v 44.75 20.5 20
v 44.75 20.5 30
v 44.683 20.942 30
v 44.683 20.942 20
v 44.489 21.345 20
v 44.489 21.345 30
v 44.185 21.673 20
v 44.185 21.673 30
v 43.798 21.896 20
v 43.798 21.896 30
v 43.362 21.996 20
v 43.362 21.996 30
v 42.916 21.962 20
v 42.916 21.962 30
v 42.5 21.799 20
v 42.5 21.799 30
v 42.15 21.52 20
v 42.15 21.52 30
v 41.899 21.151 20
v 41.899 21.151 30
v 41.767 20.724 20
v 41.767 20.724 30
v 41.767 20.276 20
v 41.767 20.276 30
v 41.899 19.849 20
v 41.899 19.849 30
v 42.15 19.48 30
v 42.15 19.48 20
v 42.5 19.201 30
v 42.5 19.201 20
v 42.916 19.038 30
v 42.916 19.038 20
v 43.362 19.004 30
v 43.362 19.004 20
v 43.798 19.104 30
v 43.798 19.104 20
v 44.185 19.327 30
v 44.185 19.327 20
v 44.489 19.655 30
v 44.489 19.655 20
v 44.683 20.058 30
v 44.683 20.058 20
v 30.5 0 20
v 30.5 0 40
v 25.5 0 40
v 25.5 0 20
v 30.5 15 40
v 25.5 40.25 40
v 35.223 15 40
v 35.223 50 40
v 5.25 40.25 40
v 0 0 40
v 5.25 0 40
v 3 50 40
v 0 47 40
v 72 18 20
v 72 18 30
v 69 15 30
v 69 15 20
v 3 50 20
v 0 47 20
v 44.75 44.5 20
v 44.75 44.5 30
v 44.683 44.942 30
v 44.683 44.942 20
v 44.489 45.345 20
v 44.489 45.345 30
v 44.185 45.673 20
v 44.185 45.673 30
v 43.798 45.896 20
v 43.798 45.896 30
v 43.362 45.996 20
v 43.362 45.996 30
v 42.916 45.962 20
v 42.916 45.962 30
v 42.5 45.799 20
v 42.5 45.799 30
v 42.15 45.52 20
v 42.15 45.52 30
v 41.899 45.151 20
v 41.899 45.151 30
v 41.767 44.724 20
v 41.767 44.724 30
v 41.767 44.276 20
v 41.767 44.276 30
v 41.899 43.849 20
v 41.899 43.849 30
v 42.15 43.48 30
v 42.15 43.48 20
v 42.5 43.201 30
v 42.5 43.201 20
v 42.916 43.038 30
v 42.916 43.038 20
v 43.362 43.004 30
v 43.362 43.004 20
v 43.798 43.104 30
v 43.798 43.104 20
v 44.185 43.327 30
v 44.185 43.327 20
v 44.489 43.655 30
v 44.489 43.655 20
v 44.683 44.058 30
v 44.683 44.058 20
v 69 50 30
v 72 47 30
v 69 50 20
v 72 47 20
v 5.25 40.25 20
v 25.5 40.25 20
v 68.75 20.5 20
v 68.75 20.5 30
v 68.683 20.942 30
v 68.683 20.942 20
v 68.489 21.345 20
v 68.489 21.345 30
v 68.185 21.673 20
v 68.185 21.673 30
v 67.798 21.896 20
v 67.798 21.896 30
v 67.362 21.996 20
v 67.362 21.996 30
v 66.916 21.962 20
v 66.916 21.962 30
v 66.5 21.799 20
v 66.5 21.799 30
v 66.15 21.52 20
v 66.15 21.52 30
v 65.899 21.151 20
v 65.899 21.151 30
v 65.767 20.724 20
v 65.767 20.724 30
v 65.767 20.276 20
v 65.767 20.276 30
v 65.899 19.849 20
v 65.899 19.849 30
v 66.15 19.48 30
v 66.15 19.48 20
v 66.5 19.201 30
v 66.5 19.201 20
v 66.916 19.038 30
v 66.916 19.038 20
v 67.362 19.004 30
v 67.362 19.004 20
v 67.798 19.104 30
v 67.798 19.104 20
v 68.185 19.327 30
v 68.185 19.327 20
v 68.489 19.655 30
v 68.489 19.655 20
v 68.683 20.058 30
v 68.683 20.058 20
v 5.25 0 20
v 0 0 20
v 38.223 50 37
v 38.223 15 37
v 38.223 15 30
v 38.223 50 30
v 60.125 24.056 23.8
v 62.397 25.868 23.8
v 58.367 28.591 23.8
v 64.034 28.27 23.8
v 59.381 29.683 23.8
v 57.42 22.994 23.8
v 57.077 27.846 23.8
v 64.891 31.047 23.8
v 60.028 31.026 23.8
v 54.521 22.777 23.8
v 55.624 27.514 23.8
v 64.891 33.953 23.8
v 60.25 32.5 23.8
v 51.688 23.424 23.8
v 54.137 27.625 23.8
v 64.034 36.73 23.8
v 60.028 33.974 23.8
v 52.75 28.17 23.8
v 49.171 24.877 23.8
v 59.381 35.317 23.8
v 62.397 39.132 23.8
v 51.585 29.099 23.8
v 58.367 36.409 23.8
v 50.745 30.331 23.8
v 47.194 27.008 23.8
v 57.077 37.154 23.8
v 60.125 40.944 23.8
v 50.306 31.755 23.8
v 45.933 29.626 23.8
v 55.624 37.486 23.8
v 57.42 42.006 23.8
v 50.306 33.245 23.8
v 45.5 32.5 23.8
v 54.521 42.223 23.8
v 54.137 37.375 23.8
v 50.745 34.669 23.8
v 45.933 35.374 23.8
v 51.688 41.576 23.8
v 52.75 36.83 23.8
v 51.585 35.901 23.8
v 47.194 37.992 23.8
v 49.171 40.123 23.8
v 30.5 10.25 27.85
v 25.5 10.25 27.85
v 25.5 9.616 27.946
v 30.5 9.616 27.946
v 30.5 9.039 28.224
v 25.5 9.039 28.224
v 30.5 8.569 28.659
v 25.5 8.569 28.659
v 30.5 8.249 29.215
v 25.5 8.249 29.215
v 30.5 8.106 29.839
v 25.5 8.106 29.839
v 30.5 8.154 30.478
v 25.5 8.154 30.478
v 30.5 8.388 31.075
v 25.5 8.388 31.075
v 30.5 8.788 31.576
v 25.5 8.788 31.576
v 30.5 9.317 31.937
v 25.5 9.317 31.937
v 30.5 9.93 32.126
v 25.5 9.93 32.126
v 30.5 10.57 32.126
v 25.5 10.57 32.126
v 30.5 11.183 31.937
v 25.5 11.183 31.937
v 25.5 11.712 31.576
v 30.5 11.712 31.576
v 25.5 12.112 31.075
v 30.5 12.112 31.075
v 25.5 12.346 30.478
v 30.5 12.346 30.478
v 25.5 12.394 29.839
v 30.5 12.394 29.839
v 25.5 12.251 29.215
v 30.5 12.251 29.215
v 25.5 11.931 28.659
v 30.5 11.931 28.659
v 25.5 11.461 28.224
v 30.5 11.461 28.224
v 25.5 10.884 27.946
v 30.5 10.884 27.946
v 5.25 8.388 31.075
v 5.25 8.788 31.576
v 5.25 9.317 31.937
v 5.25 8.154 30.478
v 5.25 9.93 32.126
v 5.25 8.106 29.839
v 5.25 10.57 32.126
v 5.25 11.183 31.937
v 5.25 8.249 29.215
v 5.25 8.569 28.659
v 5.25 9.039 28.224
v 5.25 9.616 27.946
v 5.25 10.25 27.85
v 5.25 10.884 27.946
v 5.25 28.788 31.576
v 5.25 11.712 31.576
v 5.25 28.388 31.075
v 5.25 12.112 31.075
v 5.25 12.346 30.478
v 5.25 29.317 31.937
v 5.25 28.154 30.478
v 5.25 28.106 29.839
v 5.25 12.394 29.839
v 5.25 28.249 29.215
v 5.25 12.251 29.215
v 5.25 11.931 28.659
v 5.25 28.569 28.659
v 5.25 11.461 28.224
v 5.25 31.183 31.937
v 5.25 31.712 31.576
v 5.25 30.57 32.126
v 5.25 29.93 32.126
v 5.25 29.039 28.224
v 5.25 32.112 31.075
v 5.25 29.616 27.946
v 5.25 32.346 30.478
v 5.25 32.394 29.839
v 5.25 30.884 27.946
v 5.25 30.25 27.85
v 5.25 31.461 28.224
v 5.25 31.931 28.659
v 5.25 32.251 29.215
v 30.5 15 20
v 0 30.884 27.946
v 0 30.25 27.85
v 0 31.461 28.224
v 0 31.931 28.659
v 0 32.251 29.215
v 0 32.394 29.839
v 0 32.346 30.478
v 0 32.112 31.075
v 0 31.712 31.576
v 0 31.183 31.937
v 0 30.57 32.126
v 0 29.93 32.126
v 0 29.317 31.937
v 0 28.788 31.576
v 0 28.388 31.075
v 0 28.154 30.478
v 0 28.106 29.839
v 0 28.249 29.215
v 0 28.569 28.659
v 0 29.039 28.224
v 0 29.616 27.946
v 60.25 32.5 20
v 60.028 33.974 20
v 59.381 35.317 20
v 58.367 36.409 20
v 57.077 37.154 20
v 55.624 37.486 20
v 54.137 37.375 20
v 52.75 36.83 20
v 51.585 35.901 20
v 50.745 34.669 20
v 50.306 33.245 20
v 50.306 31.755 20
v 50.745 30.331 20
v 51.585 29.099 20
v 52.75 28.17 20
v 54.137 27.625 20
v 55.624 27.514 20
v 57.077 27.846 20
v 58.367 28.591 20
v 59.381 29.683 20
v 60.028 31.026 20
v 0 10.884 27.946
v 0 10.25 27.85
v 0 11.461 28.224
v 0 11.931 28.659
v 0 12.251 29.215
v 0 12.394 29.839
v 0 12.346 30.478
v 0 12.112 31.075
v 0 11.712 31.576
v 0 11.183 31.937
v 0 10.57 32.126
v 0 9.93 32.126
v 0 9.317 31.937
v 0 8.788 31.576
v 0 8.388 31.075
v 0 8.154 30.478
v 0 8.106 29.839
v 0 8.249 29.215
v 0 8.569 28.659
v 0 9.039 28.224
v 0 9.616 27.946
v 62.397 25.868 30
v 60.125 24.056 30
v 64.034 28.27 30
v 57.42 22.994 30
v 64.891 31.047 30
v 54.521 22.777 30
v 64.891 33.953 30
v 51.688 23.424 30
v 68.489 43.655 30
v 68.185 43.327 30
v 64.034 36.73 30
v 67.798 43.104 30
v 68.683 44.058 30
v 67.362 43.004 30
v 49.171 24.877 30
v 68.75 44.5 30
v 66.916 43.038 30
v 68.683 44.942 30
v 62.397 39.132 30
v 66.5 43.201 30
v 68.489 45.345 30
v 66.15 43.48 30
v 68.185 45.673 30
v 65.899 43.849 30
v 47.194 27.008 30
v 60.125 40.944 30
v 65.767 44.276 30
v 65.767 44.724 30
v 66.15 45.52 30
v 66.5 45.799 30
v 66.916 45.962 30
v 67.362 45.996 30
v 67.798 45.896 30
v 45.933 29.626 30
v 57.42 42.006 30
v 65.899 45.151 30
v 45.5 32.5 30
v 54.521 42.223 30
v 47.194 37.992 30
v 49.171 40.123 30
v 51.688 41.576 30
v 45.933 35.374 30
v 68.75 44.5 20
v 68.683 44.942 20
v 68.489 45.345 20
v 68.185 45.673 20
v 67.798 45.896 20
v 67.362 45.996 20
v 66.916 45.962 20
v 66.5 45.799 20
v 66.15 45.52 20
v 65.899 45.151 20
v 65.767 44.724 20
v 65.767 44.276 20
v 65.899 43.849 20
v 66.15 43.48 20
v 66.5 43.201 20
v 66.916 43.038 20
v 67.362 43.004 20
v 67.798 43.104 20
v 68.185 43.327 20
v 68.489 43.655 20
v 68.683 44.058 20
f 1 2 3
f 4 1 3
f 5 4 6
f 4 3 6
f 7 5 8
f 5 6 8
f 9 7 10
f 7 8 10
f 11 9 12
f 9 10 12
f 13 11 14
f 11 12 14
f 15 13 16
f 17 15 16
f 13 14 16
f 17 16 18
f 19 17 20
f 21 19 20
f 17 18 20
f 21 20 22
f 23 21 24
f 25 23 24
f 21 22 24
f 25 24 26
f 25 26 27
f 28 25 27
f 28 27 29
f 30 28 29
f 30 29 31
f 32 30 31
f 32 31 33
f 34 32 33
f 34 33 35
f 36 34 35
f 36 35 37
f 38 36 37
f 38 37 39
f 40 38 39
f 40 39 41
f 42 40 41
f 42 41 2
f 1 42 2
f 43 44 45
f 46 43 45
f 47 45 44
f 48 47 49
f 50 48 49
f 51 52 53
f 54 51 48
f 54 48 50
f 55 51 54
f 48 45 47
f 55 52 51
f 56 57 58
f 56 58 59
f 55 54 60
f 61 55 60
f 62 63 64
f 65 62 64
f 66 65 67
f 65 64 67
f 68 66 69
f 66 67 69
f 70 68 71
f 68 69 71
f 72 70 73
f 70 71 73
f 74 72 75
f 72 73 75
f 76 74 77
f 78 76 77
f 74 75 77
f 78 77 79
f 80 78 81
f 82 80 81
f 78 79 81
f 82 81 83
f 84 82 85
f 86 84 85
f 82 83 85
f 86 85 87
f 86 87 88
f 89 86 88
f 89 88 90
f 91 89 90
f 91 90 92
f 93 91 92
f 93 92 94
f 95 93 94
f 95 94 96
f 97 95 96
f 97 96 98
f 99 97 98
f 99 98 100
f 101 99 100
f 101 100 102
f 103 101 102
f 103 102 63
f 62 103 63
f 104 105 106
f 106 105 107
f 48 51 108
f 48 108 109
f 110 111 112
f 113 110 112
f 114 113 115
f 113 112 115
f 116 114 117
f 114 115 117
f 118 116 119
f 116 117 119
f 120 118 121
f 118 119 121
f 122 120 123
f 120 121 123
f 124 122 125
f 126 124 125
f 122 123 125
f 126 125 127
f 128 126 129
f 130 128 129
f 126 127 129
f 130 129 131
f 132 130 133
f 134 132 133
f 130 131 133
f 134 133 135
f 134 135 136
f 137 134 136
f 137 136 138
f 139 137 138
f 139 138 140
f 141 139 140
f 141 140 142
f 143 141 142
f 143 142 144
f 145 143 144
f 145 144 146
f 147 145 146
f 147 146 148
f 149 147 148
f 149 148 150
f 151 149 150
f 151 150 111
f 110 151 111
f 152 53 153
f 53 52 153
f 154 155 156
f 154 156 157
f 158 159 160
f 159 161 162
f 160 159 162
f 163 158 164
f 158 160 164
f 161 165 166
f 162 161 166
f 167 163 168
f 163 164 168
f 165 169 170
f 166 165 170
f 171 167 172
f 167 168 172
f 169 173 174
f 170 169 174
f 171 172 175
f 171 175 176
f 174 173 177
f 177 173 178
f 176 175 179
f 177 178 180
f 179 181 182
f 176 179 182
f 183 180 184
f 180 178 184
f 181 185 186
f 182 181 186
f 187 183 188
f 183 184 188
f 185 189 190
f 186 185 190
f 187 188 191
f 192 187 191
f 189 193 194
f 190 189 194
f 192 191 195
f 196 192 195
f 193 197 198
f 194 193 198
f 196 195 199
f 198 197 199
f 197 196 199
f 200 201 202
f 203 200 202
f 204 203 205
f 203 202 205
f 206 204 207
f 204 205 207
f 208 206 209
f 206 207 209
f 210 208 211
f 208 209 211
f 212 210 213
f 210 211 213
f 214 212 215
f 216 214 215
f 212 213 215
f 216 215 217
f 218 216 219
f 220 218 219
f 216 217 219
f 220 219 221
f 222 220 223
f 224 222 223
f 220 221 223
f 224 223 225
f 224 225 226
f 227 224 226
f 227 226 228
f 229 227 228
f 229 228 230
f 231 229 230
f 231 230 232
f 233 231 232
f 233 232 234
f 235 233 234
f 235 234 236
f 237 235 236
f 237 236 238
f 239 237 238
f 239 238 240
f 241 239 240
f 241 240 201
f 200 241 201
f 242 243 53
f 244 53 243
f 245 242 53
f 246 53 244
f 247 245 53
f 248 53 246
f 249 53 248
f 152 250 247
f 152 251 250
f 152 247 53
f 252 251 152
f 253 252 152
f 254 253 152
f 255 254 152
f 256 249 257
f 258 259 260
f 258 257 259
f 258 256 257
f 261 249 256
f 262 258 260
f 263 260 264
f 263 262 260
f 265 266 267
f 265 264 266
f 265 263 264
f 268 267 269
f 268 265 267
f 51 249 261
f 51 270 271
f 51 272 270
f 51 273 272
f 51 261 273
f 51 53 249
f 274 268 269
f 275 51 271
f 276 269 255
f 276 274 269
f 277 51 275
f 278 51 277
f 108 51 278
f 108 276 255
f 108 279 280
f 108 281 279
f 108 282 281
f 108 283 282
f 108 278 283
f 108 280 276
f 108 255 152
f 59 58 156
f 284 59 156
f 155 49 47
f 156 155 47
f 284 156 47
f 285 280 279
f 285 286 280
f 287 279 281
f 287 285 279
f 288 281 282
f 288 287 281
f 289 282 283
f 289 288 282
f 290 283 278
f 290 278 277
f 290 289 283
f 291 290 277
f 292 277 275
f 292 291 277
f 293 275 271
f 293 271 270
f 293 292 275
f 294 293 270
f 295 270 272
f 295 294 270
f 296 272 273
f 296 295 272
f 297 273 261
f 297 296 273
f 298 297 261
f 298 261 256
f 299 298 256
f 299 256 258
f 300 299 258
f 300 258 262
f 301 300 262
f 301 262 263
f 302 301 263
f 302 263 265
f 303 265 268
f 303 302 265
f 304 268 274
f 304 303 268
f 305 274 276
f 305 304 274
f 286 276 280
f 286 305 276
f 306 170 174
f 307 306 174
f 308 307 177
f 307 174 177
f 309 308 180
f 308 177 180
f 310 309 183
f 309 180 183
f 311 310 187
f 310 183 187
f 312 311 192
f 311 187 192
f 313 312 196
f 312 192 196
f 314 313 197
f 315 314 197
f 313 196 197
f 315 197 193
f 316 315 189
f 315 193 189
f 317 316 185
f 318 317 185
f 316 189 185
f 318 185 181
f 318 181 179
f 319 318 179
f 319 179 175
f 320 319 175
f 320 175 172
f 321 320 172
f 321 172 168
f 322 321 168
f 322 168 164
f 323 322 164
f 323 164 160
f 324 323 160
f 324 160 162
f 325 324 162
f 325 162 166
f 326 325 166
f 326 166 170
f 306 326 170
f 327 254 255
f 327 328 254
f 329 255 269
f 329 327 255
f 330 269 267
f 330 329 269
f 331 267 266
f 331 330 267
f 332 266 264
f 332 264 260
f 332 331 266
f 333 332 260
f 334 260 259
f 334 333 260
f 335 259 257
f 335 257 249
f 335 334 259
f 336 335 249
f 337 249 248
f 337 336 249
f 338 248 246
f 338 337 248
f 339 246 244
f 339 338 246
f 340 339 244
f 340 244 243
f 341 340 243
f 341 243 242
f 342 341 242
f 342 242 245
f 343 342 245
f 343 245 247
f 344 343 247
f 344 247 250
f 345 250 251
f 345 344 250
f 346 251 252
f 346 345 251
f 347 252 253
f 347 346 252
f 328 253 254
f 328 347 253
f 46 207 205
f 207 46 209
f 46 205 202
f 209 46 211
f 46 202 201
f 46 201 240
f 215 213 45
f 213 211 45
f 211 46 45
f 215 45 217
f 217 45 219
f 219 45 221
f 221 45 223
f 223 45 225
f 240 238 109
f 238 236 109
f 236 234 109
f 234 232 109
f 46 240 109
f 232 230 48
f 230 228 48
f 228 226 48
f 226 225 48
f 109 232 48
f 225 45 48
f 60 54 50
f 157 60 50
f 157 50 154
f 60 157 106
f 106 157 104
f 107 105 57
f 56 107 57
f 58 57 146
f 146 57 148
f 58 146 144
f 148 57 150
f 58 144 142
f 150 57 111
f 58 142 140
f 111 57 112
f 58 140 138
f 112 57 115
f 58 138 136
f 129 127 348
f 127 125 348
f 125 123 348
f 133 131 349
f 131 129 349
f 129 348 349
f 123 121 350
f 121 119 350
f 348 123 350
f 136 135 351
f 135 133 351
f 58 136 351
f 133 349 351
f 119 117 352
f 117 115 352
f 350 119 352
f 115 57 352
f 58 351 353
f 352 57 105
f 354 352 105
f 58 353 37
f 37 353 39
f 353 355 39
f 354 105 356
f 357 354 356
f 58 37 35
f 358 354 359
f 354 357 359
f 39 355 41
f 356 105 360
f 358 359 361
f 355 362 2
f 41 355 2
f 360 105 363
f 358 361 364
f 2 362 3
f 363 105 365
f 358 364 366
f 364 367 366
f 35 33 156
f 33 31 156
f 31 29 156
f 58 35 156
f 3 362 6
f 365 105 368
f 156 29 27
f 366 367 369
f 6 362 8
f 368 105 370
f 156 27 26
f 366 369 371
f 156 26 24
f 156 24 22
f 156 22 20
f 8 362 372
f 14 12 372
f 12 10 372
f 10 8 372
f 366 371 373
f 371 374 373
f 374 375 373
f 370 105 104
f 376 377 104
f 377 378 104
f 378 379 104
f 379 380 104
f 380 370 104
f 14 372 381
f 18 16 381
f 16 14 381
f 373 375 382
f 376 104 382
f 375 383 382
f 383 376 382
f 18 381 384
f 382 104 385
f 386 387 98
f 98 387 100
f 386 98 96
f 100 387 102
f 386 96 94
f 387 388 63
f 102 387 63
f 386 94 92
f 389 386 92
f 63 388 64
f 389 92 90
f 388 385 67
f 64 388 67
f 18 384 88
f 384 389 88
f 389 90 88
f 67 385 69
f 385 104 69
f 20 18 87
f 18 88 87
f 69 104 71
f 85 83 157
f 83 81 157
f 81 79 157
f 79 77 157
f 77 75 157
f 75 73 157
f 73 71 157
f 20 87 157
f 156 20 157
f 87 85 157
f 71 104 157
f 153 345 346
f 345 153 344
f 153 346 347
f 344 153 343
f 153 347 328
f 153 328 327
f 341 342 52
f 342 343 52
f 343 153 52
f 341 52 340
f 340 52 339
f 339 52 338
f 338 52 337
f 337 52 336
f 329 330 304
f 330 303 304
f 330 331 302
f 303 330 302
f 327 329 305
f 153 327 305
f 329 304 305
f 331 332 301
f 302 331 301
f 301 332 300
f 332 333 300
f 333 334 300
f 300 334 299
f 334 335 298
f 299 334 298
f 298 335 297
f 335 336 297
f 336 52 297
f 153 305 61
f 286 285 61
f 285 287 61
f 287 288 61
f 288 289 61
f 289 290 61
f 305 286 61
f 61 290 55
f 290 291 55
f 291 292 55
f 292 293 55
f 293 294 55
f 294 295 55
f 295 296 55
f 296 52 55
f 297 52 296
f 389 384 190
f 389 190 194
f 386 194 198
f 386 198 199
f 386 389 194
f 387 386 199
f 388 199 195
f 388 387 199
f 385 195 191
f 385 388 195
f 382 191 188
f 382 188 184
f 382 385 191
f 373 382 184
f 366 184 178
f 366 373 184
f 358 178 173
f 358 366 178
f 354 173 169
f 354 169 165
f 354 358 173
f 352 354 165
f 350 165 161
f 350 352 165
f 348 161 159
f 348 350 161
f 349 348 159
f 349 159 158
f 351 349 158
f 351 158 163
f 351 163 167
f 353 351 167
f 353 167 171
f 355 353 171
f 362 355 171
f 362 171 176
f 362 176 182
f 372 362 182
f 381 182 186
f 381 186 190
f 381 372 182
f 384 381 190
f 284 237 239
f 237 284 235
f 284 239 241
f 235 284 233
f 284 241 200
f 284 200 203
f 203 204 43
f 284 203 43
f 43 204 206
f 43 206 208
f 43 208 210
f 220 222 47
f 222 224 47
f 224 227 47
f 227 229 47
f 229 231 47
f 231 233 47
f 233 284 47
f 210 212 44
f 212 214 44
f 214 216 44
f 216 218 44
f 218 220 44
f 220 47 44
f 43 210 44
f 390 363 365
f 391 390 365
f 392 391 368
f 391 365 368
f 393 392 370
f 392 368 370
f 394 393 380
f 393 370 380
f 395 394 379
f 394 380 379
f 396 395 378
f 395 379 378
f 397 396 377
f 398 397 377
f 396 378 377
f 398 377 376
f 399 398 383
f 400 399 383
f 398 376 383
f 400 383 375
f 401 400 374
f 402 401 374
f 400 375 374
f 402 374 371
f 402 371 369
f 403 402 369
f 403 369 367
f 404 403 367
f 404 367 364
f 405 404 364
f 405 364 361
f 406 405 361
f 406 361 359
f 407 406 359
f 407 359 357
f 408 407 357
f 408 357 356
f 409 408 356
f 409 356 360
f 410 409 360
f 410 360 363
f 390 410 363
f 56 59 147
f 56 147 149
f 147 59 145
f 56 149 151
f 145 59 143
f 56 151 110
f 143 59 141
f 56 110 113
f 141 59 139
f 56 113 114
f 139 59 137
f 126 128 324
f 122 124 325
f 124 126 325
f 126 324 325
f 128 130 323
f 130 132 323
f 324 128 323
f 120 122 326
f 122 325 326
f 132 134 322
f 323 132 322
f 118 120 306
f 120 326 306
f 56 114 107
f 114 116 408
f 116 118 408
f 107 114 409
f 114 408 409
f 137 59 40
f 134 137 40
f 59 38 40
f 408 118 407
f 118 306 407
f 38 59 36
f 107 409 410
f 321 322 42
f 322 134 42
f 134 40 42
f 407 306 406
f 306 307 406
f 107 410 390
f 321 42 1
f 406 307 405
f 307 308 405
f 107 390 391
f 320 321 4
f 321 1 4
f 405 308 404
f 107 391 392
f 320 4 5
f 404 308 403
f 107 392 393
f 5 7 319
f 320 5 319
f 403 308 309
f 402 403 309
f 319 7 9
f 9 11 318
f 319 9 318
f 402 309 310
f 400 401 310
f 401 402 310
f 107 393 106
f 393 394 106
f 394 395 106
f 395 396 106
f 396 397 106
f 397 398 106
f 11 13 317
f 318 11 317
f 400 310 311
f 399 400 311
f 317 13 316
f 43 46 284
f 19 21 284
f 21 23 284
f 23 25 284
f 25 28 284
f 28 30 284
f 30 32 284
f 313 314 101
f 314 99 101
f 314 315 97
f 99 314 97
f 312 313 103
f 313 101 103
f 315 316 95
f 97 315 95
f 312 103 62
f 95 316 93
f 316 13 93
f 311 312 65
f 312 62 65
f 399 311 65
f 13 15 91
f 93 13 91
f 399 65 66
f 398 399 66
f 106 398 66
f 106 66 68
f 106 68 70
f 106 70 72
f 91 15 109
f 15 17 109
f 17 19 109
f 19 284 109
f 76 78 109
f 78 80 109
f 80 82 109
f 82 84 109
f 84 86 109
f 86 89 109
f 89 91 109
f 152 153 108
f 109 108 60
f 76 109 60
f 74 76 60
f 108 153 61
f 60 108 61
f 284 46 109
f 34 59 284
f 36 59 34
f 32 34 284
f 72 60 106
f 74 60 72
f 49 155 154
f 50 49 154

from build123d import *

# Parameters (mm, degrees)
SKETCH_5_R          = 5
SKETCH_5_R_2        = 1.5
EXTRUDE_1_DEPTH     = 20
SKETCH_6_R          = 2.15
CUT_EXTRUDE_3_DEPTH = 20
CUT_EXTRUDE_START   = -20
SKETCH_7_R          = 2.15
CUT_EXTRUDE_4_DEPTH = 20
SKETCH_8_W          = 33.77726644
SKETCH_8_H          = 35
CUT_EXTRUDE_5_DEPTH = 10
SKETCH_9_R          = 9.75
CUT_EXTRUDE_6_DEPTH = 6.2
CHAMFER_1_SIZE      = 3
SKETCH_12_W         = 110.408141216
SKETCH_12_H         = 73.303439967
CUT_EXTRUDE_8_DEPTH = 20
SKETCH_13_W         = 20.5
SKETCH_13_H         = 20
EXTRUDE_2_DEPTH     = 0.25
SKETCH_14_W         = 20
SKETCH_14_H         = 40.25
SKETCH_14_R         = 2.15
EXTRUDE_3_DEPTH     = 0.25


with BuildPart() as part:
    # 草图5 → 凸台-拉伸1 (new body)
    with BuildSketch(Plane.XY):
        Polygon((0, 0), (0, 50), (72, 50), (72, 15), (30.5, 15), (30.5, 0), (25.5, 0), (25.5, 40.5), (5, 40.5), (5, 0), align=None)
        with Locations((55.25, 32.5)):
            Circle(SKETCH_5_R, mode=Mode.SUBTRACT)
        with Locations((43.25, 44.5)):
            Circle(SKETCH_5_R_2, mode=Mode.SUBTRACT)
        with Locations((67.25, 44.5)):
            Circle(SKETCH_5_R_2, mode=Mode.SUBTRACT)
        with Locations((43.25, 20.5)):
            Circle(SKETCH_5_R_2, mode=Mode.SUBTRACT)
        with Locations((67.25, 20.5)):
            Circle(SKETCH_5_R_2, mode=Mode.SUBTRACT)
    extrude(amount=EXTRUDE_1_DEPTH)

    # 草图6 → 切除-拉伸3 (cut)
    with BuildSketch(Plane.ZY):
        with Locations((10, 10.25)):
            Circle(SKETCH_6_R)
        with Locations((10, 30.25)):
            Circle(SKETCH_6_R)
    extrude(amount=-CUT_EXTRUDE_3_DEPTH, mode=Mode.SUBTRACT)

    # 草图7 → 切除-拉伸4 (cut)
    with BuildSketch(Plane(origin=(30.5, 0, 0), x_dir=(0, 0, -1), z_dir=(1, 0, 0)).offset(CUT_EXTRUDE_START)):
        with Locations(Location((-10, 10.25, 0), (0, 0, 180))):
            Circle(SKETCH_7_R)
    extrude(amount=CUT_EXTRUDE_4_DEPTH, mode=Mode.SUBTRACT)

    # 草图8 → 切除-拉伸5 (cut)
    with BuildSketch(Plane(origin=(0, 0, 0), x_dir=(-1, 0, 0), z_dir=(0, 0, -1))):
        with Locations((-55.11136678, 32.5)):
            Rectangle(SKETCH_8_W, SKETCH_8_H)
    extrude(amount=-CUT_EXTRUDE_5_DEPTH, mode=Mode.SUBTRACT)

    # 草图9 → 切除-拉伸6 (cut)
    with BuildSketch(Plane(origin=(0, 0, 10), x_dir=(-1, 0, 0), z_dir=(0, 0, -1))):
        with Locations((-55.25, 32.5)):
            Circle(SKETCH_9_R)
    extrude(amount=-CUT_EXTRUDE_6_DEPTH, mode=Mode.SUBTRACT)

    # 倒角1
    chamfer_1_edges = [part.edges().sort_by_distance(p)[0] for p in [
        (0, 50, 10),
        (72, 50, 15),
        (72, 15, 15),
        (38.22273356, 32.5, 0),
    ]]
    chamfer(chamfer_1_edges, length=CHAMFER_1_SIZE)


with BuildPart() as body_2:
    # 镜向1: mirrored copy
    add(part.part.mirror(Plane(origin=(0, 0, 20), x_dir=(1, 0, 0), z_dir=(0, 0, -1))))

    # 草图13 → 凸台-拉伸2 (add)
    with BuildSketch(Plane.XZ.offset(-40.5)):
        with Locations((15.25, 30)):
            Rectangle(SKETCH_13_W, SKETCH_13_H)
    extrude(amount=EXTRUDE_2_DEPTH)

    # 草图14 → 凸台-拉伸3 (add)
    with BuildSketch(Plane(origin=(5, 0, 0), x_dir=(0, 0, -1), z_dir=(1, 0, 0))):
        with Locations((-30, 20.125)):
            Rectangle(SKETCH_14_W, SKETCH_14_H)
        with Locations((-30, 10.25)):
            Circle(SKETCH_14_R, mode=Mode.SUBTRACT)
        with Locations((-30, 30.25)):
            Circle(SKETCH_14_R, mode=Mode.SUBTRACT)
    extrude(amount=EXTRUDE_3_DEPTH)


with BuildPart() as part_1:
    add(part.part)

    # 草图12 → 切除-拉伸8 (cut)
    with BuildSketch(Plane(origin=(0, 0, 0), x_dir=(-1, 0, 0), z_dir=(0, 0, -1))):
        with Locations((-31.097159048, 24.893638624)):
            Rectangle(SKETCH_12_W, SKETCH_12_H)
    extrude(amount=-CUT_EXTRUDE_8_DEPTH, mode=Mode.SUBTRACT)


solid = body_2.part
